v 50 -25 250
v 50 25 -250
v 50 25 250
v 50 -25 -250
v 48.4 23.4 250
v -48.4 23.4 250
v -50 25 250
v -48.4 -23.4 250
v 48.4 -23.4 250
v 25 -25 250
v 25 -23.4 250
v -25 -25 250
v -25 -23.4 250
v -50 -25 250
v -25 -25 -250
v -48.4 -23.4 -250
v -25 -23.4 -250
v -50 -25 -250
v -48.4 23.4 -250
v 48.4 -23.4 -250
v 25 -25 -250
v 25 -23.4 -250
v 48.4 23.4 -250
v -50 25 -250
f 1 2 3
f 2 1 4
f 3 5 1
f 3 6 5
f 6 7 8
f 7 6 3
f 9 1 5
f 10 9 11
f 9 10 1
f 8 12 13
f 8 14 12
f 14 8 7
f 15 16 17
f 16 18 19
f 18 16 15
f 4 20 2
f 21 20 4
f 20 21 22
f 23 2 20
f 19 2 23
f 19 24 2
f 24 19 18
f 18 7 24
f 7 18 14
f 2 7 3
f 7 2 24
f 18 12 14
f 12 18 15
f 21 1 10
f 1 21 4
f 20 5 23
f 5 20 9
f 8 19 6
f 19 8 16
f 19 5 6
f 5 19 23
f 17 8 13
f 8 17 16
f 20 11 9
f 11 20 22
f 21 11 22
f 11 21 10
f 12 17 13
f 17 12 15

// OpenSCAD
cSection(100,50,1.6,500);

module cSection(w=100,d=50,t,l=200){
    difference(){
        cube([w,d,l],center=true);
        cube([w-2*t,d-2*t,l+2],center=true);
        translate([0,-d/2,0])cube([w/2,t+2,l+2],center=true);
    }
}
